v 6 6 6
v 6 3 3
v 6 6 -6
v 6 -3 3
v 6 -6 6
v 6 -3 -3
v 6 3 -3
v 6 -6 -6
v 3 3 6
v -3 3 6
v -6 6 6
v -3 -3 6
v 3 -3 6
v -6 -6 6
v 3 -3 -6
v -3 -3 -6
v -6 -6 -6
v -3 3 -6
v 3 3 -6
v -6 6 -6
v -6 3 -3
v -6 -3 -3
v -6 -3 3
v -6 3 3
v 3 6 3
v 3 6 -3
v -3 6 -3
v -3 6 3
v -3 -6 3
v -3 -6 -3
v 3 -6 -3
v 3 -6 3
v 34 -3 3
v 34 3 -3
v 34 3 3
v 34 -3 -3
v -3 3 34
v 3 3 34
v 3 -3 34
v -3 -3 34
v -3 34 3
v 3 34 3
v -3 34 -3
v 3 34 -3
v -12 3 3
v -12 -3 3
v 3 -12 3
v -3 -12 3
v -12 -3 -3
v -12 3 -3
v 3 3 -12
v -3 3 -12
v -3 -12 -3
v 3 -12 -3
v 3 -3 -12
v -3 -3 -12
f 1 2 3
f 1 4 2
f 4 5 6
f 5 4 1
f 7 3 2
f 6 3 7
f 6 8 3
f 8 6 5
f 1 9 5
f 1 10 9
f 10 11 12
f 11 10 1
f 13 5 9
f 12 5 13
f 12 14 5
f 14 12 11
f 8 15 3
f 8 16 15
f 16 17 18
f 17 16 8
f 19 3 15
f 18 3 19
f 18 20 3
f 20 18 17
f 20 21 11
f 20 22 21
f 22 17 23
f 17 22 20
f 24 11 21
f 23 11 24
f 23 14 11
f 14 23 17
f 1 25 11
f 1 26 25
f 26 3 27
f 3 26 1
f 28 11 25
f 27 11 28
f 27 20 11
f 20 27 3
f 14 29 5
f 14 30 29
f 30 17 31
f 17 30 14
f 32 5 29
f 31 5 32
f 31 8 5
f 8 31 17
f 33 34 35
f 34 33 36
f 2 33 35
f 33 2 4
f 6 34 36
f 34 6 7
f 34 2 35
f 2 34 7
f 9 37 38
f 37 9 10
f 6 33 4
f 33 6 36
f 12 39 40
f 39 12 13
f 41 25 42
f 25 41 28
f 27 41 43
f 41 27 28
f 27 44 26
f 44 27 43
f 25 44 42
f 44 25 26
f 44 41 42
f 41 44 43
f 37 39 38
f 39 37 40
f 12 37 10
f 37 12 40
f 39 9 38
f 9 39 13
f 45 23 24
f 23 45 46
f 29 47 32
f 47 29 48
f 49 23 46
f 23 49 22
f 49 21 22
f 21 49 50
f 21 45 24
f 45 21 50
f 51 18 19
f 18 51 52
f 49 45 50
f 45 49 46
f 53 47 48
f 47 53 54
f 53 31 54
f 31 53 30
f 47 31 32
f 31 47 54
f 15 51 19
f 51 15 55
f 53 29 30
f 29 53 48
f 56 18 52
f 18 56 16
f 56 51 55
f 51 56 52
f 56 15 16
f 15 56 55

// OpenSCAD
// Calibration fixture: RGB axis arms to verify snapshot camera presets.
// Convention (universal CAD): RED = +X, GREEN = +Y, BLUE = +Z.
module arm(len) translate([0,-3,-3]) cube([len,6,6]);
color("dimgray") translate([-6,-6,-6]) cube(12);     // origin block
color("red")   arm(34);                  // +X  (RIGHT)
color("green") rotate([0,0,90])  arm(34);// +Y  (BACK)
color("blue")  rotate([0,-90,0]) arm(34);// +Z  (TOP)
// short stubs on negative axes so we can tell +/- apart
color("salmon")     rotate([0,0,180]) arm(12);  // -X
color("lightgreen") rotate([0,0,-90]) arm(12);  // -Y (FRONT)
color("lightblue")  rotate([0,90,0])  arm(12);  // -Z (BOTTOM)
